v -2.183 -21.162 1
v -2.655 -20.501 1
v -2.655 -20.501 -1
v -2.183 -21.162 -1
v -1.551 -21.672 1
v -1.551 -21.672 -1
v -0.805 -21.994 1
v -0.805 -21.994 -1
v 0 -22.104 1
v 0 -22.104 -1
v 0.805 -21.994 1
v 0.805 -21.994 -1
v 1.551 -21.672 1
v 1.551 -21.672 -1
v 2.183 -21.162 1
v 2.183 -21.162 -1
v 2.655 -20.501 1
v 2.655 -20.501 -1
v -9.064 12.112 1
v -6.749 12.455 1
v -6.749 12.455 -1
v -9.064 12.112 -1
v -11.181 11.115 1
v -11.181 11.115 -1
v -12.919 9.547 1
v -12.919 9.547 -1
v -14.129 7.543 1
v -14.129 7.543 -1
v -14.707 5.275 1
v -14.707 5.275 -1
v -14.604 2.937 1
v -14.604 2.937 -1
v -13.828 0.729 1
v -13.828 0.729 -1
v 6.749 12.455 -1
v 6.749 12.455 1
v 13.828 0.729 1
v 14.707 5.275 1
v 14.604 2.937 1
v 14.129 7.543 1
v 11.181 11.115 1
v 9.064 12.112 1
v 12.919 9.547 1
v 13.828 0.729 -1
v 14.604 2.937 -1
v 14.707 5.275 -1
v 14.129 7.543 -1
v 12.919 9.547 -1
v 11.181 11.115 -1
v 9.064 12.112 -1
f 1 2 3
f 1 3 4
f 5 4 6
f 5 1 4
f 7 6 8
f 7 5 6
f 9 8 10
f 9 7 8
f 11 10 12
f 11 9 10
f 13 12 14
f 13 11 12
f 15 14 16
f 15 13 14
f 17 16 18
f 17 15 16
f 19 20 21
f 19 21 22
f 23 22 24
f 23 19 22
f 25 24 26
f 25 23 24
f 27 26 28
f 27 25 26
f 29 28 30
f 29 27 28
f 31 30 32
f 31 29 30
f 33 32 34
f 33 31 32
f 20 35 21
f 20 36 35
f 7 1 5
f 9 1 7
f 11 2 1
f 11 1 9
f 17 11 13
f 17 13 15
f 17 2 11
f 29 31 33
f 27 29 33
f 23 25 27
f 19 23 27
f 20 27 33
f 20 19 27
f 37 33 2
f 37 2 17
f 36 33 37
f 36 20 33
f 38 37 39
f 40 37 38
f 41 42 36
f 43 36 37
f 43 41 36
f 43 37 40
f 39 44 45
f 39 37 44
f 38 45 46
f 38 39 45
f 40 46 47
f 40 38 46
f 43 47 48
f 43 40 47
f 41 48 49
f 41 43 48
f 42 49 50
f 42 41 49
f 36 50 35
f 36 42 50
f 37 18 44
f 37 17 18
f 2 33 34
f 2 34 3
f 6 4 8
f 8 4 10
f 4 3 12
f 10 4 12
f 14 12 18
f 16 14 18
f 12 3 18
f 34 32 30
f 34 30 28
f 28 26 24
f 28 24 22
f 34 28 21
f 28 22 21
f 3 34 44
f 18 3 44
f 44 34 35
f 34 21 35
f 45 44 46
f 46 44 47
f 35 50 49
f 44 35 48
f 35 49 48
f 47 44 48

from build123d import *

# Parameters (mm, degrees)
F1_DEPTH = 1


# Not quite as in the source:
# - a feature of the source that left no trace in its solid (it failed there, or was rolled back) is left out


with BuildPart() as f1:
    # F0 (on Top) → F1 (new body, symmetric)
    with BuildSketch(Plane.XY):
        with BuildLine():
            Line((6.7490902932, 12.4546424842), (-6.7490902932, 12.4546424842))
            ThreePointArc((-6.7490902932, 12.4546424842), (-13.5977314614, 8.5893872344), (-13.8284360723, 0.7286710215))
            Line((-13.8284360723, 0.7286710215), (-2.6547546671, -20.5013236482))
            ThreePointArc((-2.6547546671, -20.5013236482), (0, -22.1040843497), (2.6547546671, -20.5013236482))
            Line((2.6547546671, -20.5013236482), (13.8284360723, 0.7286710215))
            ThreePointArc((13.8284360723, 0.7286710215), (13.5977314614, 8.5893872344), (6.7490902932, 12.4546424842))
        make_face()
    extrude(amount=F1_DEPTH, both=True)


solid = f1.part
